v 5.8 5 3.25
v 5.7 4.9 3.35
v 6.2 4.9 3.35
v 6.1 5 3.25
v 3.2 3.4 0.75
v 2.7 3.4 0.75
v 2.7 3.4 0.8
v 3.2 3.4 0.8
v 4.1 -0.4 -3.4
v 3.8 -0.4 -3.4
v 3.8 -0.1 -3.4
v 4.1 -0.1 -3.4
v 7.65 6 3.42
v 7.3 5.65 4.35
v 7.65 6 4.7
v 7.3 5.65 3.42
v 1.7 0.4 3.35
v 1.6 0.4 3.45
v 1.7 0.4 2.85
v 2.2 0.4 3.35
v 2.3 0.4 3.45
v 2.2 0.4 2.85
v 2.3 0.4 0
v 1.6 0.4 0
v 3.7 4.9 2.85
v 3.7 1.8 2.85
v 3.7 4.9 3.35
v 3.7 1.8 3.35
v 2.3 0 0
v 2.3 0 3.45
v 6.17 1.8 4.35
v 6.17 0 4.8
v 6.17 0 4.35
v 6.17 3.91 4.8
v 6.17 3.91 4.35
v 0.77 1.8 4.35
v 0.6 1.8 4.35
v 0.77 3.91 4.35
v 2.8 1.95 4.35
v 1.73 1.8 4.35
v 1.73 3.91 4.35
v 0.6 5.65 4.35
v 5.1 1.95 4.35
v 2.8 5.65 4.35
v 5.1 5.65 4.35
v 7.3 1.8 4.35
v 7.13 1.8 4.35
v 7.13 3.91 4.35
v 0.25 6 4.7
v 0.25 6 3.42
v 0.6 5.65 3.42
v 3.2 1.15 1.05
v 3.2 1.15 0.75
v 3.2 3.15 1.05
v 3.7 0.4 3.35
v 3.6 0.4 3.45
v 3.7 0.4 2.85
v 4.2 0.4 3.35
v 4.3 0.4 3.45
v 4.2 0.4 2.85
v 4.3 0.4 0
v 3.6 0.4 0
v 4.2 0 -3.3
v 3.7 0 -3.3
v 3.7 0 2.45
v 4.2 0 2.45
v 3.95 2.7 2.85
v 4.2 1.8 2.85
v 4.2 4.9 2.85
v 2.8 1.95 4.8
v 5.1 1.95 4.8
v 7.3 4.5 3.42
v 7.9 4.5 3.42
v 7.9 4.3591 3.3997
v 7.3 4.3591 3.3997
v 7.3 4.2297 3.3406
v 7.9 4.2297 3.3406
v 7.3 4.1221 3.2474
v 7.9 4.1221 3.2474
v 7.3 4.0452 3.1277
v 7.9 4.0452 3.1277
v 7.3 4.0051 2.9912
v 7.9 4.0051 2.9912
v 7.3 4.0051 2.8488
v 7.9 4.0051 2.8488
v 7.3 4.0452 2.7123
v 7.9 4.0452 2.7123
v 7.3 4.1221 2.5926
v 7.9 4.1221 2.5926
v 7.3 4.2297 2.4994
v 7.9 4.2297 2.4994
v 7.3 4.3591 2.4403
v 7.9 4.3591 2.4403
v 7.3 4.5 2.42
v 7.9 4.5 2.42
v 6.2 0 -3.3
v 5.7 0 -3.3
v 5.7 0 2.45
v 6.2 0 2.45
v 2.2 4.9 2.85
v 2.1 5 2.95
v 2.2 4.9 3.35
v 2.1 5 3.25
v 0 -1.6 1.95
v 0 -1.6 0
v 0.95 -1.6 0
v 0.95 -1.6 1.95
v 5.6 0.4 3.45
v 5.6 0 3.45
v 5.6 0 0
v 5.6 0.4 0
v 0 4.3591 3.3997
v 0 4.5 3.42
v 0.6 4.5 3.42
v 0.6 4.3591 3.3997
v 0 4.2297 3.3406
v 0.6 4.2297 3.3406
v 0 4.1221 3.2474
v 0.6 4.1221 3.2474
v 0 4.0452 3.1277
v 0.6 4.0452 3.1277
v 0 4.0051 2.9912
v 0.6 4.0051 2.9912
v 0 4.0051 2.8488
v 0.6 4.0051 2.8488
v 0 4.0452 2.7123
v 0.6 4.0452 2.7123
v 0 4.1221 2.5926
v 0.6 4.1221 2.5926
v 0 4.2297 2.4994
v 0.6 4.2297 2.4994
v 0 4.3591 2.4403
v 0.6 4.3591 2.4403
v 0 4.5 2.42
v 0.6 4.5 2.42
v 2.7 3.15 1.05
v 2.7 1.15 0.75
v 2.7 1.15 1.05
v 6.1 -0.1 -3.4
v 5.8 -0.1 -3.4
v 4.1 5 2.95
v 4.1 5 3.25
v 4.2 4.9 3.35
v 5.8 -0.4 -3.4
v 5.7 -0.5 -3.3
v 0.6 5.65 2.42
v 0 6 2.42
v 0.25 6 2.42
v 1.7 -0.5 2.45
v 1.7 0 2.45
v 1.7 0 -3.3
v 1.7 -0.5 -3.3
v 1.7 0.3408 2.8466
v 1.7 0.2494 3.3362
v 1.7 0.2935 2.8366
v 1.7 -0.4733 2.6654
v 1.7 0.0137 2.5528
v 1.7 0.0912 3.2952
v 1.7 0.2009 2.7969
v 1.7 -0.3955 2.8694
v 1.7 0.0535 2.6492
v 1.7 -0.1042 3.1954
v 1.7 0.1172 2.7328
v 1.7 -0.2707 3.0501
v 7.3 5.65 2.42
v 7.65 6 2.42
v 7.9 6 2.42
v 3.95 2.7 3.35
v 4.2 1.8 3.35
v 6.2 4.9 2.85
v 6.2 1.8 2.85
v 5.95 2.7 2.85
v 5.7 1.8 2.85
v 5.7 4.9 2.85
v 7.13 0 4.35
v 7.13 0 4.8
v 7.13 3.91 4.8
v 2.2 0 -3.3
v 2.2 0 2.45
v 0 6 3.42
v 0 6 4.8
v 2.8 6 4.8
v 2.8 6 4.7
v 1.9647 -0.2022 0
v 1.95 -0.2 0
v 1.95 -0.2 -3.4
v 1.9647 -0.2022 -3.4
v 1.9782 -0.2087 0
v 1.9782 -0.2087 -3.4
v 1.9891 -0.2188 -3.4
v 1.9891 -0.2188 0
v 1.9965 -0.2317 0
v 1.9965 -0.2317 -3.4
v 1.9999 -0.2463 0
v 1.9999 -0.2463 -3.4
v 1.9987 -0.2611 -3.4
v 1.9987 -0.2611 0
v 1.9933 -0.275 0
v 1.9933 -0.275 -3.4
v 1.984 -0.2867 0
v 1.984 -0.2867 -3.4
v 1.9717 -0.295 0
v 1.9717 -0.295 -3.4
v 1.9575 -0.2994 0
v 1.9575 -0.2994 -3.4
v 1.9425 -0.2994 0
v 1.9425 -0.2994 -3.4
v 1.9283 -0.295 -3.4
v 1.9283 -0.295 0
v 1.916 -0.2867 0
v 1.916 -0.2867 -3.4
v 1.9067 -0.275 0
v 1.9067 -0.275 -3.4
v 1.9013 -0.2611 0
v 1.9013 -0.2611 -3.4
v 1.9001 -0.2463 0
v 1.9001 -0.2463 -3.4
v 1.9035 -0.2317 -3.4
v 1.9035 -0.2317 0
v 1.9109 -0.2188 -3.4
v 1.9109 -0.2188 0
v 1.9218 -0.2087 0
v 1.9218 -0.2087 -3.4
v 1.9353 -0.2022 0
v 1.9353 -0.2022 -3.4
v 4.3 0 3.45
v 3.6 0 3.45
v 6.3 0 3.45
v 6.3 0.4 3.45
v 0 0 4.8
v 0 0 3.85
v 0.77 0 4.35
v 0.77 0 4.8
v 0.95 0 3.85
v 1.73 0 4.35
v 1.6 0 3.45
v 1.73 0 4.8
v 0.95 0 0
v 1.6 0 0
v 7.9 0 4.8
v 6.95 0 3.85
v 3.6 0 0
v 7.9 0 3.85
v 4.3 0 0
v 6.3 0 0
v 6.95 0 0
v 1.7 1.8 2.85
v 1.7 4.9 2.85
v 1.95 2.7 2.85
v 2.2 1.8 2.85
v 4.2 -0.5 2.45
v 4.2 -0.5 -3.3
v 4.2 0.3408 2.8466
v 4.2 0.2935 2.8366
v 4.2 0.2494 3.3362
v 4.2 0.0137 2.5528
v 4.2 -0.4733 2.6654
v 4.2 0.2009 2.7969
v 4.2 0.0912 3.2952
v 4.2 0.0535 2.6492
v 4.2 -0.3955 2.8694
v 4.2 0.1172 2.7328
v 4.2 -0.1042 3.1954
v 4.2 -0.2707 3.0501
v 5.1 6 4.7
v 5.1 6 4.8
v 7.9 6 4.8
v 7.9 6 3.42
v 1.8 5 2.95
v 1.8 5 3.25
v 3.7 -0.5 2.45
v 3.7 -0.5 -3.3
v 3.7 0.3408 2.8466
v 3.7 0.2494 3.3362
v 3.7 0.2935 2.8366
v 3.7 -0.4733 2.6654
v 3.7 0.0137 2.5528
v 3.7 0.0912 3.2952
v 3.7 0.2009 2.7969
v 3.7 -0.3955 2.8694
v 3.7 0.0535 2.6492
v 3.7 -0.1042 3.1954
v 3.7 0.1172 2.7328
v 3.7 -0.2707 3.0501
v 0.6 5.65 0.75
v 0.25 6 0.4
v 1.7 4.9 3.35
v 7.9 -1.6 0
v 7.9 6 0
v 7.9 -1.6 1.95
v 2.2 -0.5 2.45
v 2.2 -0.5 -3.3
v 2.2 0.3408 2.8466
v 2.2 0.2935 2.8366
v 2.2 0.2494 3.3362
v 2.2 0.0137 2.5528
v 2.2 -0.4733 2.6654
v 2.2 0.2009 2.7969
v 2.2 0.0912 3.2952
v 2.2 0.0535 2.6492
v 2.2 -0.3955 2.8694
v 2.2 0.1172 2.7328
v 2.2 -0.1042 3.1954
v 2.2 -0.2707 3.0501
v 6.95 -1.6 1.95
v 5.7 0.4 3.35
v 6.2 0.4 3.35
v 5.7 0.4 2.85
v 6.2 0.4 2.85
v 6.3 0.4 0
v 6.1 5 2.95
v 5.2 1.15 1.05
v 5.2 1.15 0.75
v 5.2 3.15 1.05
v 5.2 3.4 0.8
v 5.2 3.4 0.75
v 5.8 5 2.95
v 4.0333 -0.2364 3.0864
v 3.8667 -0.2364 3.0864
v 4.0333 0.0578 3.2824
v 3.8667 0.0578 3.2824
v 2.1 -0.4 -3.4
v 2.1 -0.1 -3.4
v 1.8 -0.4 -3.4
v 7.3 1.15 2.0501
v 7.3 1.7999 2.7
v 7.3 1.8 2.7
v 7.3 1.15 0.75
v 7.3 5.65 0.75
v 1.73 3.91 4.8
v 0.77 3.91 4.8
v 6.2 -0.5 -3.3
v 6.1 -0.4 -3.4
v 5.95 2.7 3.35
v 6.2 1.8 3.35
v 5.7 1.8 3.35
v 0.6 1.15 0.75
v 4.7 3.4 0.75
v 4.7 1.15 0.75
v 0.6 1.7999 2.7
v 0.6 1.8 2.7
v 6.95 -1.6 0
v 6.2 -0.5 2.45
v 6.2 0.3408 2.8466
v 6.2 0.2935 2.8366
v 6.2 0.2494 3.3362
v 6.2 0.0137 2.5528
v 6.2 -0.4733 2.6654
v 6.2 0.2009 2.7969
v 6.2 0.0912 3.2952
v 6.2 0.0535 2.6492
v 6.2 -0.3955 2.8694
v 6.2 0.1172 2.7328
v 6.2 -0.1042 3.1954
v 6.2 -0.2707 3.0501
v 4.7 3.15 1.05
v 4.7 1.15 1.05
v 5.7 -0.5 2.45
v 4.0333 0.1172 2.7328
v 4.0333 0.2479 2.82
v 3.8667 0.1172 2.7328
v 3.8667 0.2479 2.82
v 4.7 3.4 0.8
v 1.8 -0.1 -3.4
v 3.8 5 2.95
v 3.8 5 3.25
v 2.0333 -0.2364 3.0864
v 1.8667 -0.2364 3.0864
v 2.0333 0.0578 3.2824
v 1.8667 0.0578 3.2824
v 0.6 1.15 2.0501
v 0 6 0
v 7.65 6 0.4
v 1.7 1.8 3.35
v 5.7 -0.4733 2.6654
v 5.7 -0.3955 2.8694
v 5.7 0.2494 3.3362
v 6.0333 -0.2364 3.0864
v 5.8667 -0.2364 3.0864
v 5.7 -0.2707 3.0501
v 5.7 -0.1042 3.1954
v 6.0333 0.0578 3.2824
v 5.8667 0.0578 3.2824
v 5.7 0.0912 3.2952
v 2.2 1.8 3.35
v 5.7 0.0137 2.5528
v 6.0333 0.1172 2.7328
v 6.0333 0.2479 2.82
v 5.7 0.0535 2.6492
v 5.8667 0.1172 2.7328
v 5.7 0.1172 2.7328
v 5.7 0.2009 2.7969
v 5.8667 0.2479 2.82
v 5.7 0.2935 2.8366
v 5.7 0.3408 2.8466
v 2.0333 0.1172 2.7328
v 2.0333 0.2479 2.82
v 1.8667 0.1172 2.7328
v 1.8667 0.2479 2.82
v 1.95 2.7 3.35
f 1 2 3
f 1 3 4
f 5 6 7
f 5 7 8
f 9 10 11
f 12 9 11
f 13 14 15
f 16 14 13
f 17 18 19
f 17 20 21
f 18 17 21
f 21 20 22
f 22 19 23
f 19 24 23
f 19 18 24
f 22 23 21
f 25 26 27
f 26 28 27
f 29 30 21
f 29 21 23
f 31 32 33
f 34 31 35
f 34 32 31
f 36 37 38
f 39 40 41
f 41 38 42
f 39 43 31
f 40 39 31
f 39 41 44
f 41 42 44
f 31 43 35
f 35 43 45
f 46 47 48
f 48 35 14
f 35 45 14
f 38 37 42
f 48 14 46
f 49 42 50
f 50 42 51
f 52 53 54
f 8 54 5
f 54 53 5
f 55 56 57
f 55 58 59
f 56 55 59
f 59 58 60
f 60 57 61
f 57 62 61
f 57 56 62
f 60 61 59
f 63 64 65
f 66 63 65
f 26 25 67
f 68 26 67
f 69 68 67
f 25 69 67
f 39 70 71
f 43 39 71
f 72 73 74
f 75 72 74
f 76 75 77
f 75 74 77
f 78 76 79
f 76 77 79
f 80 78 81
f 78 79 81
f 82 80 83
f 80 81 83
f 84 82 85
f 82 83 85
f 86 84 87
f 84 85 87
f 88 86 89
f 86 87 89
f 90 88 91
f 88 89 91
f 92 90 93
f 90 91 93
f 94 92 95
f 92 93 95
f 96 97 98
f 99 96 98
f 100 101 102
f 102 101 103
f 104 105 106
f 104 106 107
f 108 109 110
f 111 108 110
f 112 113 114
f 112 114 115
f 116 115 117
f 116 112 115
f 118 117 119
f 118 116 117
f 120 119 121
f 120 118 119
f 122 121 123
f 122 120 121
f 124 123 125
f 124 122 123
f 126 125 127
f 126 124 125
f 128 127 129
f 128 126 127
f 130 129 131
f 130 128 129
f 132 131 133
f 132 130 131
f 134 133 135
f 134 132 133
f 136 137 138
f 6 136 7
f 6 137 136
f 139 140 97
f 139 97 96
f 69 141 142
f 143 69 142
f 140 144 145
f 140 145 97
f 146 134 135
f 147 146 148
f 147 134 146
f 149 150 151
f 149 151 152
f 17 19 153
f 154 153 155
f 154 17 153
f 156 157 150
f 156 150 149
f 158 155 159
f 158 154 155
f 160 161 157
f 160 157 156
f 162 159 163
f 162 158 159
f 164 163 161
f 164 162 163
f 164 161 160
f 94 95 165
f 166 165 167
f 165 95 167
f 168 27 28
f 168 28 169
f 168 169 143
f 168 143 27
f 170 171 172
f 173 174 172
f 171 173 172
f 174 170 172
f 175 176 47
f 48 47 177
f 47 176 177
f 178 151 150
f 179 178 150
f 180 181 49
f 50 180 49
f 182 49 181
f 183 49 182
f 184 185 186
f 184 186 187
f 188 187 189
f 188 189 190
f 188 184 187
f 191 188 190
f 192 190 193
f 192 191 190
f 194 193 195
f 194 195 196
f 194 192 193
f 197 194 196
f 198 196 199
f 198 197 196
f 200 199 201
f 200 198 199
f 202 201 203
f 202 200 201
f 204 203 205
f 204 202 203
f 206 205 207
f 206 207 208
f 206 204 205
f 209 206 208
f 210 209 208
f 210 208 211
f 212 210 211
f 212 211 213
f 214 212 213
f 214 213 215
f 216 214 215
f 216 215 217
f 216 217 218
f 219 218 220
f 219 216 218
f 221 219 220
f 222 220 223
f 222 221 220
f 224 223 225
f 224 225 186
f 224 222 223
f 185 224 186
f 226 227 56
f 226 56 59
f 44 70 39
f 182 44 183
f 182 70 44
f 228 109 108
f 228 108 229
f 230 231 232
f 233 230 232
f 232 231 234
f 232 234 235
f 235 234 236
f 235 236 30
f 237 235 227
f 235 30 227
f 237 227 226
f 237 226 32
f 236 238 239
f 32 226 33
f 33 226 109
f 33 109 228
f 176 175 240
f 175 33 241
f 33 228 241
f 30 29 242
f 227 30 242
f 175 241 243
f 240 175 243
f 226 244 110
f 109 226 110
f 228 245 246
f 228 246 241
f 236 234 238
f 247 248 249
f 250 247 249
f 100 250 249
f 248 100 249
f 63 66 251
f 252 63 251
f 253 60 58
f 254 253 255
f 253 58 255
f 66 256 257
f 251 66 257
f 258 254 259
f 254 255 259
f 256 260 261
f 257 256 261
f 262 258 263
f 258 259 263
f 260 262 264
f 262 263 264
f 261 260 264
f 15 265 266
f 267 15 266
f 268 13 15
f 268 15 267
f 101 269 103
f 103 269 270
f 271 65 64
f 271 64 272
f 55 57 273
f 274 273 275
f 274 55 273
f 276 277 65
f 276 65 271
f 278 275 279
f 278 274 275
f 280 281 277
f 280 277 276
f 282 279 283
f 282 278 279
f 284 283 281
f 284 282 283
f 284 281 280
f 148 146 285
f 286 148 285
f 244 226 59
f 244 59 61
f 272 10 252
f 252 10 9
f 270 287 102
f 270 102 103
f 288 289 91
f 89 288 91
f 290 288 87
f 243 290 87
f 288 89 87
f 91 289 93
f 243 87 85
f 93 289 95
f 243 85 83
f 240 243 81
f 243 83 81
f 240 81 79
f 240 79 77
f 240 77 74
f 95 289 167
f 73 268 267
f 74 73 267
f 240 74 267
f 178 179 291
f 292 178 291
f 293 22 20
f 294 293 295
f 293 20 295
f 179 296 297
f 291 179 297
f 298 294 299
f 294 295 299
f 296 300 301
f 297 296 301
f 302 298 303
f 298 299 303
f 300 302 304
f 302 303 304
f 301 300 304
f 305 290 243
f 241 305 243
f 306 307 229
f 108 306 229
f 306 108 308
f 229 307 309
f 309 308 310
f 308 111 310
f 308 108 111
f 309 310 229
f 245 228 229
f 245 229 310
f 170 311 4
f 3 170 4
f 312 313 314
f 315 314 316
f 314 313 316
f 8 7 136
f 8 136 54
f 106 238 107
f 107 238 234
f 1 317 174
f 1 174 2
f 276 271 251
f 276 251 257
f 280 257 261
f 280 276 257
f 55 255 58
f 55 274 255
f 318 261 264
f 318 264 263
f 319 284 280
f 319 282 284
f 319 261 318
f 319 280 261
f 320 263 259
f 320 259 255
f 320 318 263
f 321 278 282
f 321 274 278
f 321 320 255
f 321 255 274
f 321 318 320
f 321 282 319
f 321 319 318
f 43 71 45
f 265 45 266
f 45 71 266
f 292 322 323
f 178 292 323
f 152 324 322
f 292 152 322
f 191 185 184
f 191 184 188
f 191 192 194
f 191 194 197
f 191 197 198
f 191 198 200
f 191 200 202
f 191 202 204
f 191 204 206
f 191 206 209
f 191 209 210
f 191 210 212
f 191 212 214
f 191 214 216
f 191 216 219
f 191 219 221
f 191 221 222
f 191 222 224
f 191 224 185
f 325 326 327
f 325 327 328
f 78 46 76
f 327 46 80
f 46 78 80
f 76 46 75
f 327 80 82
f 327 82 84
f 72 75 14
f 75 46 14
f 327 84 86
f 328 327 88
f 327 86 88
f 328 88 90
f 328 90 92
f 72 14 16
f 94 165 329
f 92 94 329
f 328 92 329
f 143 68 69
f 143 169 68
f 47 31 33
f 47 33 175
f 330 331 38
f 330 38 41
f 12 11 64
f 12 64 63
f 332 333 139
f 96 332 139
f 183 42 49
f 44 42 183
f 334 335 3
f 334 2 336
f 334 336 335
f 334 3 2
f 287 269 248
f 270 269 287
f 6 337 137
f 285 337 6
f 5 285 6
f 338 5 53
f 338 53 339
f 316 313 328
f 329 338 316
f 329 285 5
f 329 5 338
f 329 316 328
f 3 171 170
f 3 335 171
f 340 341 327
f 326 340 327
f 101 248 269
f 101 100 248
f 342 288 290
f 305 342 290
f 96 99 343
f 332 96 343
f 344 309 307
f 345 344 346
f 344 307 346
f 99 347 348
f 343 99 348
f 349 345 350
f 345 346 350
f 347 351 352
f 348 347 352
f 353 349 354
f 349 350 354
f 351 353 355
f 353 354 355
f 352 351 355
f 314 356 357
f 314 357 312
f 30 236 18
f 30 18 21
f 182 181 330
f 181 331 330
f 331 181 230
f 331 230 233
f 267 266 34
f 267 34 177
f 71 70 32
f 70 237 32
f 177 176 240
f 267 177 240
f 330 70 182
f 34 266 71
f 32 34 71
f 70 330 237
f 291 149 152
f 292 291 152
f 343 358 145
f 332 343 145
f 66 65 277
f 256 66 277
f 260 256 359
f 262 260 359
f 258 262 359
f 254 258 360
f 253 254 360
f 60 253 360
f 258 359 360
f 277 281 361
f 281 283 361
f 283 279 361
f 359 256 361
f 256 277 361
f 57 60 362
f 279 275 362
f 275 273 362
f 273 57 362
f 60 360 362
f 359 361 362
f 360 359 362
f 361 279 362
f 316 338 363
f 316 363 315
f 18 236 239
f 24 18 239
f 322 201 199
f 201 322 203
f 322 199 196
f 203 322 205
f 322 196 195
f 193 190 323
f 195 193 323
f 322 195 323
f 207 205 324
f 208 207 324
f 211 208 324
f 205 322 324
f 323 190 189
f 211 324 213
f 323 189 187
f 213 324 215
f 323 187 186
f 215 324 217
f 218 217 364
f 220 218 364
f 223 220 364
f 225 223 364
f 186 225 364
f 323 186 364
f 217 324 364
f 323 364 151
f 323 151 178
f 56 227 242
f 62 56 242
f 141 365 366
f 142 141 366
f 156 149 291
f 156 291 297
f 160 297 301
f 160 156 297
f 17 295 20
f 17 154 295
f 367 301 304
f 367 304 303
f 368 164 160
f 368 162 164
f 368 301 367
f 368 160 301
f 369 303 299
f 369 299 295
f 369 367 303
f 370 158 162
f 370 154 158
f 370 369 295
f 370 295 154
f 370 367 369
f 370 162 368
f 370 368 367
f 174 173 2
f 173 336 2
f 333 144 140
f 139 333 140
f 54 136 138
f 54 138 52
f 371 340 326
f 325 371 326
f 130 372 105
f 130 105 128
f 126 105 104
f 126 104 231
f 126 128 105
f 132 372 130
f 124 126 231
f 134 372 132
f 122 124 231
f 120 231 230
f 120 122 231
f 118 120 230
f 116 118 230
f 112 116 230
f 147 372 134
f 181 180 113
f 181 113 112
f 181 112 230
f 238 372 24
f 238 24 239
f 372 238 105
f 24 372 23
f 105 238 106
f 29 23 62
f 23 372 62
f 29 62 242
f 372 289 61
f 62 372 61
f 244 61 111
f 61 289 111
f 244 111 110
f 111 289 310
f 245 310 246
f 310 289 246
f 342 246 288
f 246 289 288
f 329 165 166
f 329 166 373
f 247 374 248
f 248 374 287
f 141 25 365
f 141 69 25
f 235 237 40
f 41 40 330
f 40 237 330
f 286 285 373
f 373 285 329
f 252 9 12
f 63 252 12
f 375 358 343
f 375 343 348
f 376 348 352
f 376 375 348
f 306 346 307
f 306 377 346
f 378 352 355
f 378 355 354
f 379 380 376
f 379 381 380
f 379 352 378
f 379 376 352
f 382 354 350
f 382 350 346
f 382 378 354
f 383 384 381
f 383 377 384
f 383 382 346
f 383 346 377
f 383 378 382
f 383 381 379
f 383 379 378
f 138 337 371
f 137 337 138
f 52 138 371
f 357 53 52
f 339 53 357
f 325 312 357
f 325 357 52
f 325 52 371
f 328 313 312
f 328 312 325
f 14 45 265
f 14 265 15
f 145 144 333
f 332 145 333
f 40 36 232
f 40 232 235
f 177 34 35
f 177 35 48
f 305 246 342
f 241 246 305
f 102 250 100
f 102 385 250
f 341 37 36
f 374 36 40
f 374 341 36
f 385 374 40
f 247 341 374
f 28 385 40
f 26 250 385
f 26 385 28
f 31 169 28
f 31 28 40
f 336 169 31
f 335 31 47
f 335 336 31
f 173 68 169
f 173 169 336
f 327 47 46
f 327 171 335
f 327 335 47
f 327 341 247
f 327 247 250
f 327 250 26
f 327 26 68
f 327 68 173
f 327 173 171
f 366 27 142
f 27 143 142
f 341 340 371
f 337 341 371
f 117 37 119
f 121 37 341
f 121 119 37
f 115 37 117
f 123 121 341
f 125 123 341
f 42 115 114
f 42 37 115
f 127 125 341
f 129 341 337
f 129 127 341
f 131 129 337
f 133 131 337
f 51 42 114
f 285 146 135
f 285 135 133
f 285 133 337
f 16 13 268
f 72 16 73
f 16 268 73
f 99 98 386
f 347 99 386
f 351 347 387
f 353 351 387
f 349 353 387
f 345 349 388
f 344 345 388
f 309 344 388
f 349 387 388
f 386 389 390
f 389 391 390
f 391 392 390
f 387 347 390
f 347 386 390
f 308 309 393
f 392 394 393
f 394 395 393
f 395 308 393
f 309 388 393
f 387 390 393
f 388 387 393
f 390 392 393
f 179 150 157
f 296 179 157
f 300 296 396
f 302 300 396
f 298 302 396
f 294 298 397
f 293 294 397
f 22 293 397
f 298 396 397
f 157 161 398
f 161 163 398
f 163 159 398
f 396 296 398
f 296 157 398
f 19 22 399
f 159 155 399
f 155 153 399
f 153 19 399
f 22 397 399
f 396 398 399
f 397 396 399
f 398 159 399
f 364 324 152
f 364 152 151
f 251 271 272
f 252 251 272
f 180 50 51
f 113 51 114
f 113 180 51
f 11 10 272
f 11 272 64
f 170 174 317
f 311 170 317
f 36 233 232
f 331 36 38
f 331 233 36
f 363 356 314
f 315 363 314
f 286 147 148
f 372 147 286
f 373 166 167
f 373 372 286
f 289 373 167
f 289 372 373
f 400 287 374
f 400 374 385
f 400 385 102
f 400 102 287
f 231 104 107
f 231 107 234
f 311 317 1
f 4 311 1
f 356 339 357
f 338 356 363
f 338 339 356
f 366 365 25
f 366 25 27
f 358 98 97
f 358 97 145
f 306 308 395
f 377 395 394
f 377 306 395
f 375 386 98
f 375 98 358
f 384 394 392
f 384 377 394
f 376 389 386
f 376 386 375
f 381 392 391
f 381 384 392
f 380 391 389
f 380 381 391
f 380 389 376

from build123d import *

# Parameters (mm, degrees)
BODY1_W                            = 7.9
BODY1_H                            = 4.8
EXTRUDE_1_DEPTH                    = 6
SKETCH_2_W                         = 6.7
SKETCH_2_H                         = 3.6
CUT_EXTRUDE_1_DEPTH                = 4.2
CHAMFER_1_SIZE                     = 0.35
SKETCH_4_W                         = 0.96
SKETCH_4_H                         = 3.91
CUT_EXTRUDE_3_DEPTH                = 0.45
SKETCH_5_W                         = 0.7
SKETCH_5_H                         = 3.45
CUT_EXTRUDE_4_DEPTH                = 0.4
CUT_EXTRUDE_6_REACH                = 13.02
SKETCH_8_W                         = 2.3
SKETCH_8_H                         = 4.05
CUT_EXTRUDE_7_REACH                = 13.02
SKETCH_15_W                        = 6.7
SKETCH_15_H                        = 1.95
CUT_EXTRUDE_9_DEPTH                = 0.65
CHAMFER_7_SIZE                     = 0.65
SKETCH_10_W                        = 0.5
SKETCH_10_H                        = 2.25
EXTRUDE_2_DEPTH                    = 0.3
CHAMFER_2_SIZE                     = 0.25
PATTERN_LINEAR_3_COUNT             = 2
PATTERN_LINEAR_3_PITCH             = 2
CHAMFER_2_OF_PATTERN_LINEAR_3_SIZE = 0.25
EXTRUDE_5_DEPTH                    = 0.95
SWEEP_START                        = 1.7
SWEEP_1_DEPTH                      = 0.5
CHAMFER_8_SIZE                     = 0.1
PATTERN_LINEAR_5_COUNT             = 3
PATTERN_LINEAR_5_PITCH             = 2
CHAMFER_8_OF_PATTERN_LINEAR_5_SIZE = 0.1
SKETCH_18_R                        = 0.05
CUT_EXTRUDE_10_DEPTH               = 3.4


# Read off the part's stored shape, not the designer's step: По траектории1
with BuildPart() as part:
    # Body1 → Бобышка-Вытянуть1 (new body)
    with BuildSketch(Plane(origin=(0, 0, 0), x_dir=(1, 0, 0), z_dir=(0, 1, 0))):
        with Locations((3.95, -2.4)):
            Rectangle(BODY1_W, BODY1_H)
    extrude(amount=EXTRUDE_1_DEPTH)

    # Эскиз2 → Вырез-Вытянуть1 (cut)
    with BuildSketch(Plane(origin=(0, 6, 0), x_dir=(1, 0, 0), z_dir=(0, 1, 0))):
        with Locations((3.95, -2.55)):
            Rectangle(SKETCH_2_W, SKETCH_2_H)
    extrude(amount=-CUT_EXTRUDE_1_DEPTH, mode=Mode.SUBTRACT)

    # Фаска1
    chamfer_1_edges = [part.edges().sort_by_distance(p)[0] for p in [
        (7.3, 6, 2.55),
        (3.95, 6, 0.75),
        (0.6, 6, 2.55),
        (3.95, 6, 4.35),
    ]]
    chamfer(chamfer_1_edges, length=CHAMFER_1_SIZE)

    # Эскиз4 → Вырез-Вытянуть3 (cut)
    with BuildSketch(Plane.XY.offset(4.8)):
        with Locations((1.25, 1.955)):
            Rectangle(SKETCH_4_W, SKETCH_4_H)
        with Locations((6.65, 1.955)):
            Rectangle(SKETCH_4_W, SKETCH_4_H)
    extrude(amount=-CUT_EXTRUDE_3_DEPTH, mode=Mode.SUBTRACT)

    # Эскиз5 → Вырез-Вытянуть4 (cut)
    with BuildSketch(Plane(origin=(0, 0, 4.8), x_dir=(1, 0, 0), z_dir=(0, 1, 0))):
        with Locations((1.95, 3.075)):
            Rectangle(SKETCH_5_W, SKETCH_5_H)
    cut_extrude_4 = extrude(amount=CUT_EXTRUDE_4_DEPTH, mode=Mode.SUBTRACT)

    # Эскиз8 → Вырез-Вытянуть6 (cut, up to next)
    with BuildSketch(Plane.XY.offset(4.8), mode=Mode.PRIVATE) as cut_extrude_6_sk1:
        with Locations((3.95, 3.975)):
            Rectangle(SKETCH_8_W, SKETCH_8_H)
    cut_extrude_6_tool1 = extrude(cut_extrude_6_sk1.sketch, amount=-CUT_EXTRUDE_6_REACH, mode=Mode.PRIVATE) & part.part
    add(cut_extrude_6_tool1.solids().sort_by_distance((3.95, 3.975, 4.8))[0], mode=Mode.SUBTRACT)

    # Эскиз9 → Вырез-Вытянуть7 (cut, up to next)
    with BuildSketch(Plane.ZY, mode=Mode.PRIVATE) as cut_extrude_7_sk1:
        with BuildLine():
            Line((2.42, 6), (3.42, 6))
            Line((3.42, 6), (3.42, 4.5))
            ThreePointArc((3.42, 4.5), (2.92, 4), (2.42, 4.5))
            Line((2.42, 4.5), (2.42, 6))
        make_face()
    cut_extrude_7_tool1 = extrude(cut_extrude_7_sk1.sketch, amount=-CUT_EXTRUDE_7_REACH, mode=Mode.PRIVATE) & part.part
    cut_extrude_7 = cut_extrude_7_tool1.solids().sort_by_distance((0, 5.05036, 2.92))[0]
    add(cut_extrude_7, mode=Mode.SUBTRACT)

    # Зеркальное отражение1: Вырез-Вытянуть7 across plane
    add(cut_extrude_7.mirror(Plane(origin=(3.95, 0, 0), x_dir=(0, 0, 1), z_dir=(1, 0, 0))), mode=Mode.SUBTRACT)

    # Эскиз15 → Вырез-Вытянуть9 (cut)
    with BuildSketch(Plane(origin=(0, 1.8, 0), x_dir=(1, 0, 0), z_dir=(0, 1, 0))):
        with Locations((3.95, -1.725)):
            Rectangle(SKETCH_15_W, SKETCH_15_H)
    extrude(amount=-CUT_EXTRUDE_9_DEPTH, mode=Mode.SUBTRACT)

    # Фаска7
    chamfer_7_edges = [part.edges().sort_by_distance(p)[0] for p in [
        (3.95, 1.15, 2.7),
    ]]
    chamfer(chamfer_7_edges, length=CHAMFER_7_SIZE - 0.0001)  # a hair under: the kernel refuses the full size

    # Эскиз10 → Бобышка-Вытянуть2 (add)
    with BuildSketch(Plane.XY.offset(0.75)):
        with Locations((2.95, 2.275)):
            Rectangle(SKETCH_10_W, SKETCH_10_H)
    extrude_2 = extrude(amount=EXTRUDE_2_DEPTH)

    # Фаска2
    chamfer_2_edges = [part.edges().sort_by_distance(p)[0] for p in [
        (2.95, 3.4, 1.05),
    ]]
    chamfer(chamfer_2_edges, length=CHAMFER_2_SIZE)

    # Линейный массив3: Бобышка-Вытянуть2 ×2
    with Locations(*[(i * PATTERN_LINEAR_3_PITCH, 0, 0) for i in range(1, PATTERN_LINEAR_3_COUNT)]):
        add(extrude_2)

    # Фаска2 of Линейный массив3
    chamfer_2_of_pattern_linear_3_edges = [part.edges().sort_by_distance(p)[0] for p in [
        (4.95, 3.4, 1.05),
    ]]
    chamfer(chamfer_2_of_pattern_linear_3_edges, length=CHAMFER_2_OF_PATTERN_LINEAR_3_SIZE)

    # Эскиз17 → Бобышка-Вытянуть5 (add)
    with BuildSketch(Plane.ZY):
        Polygon((0, -1.6), (1.95, -1.6), (3.85, 0), (0, 0), align=None)
    extrude_5 = extrude(amount=-EXTRUDE_5_DEPTH)

    # Зеркальное отражение3: Бобышка-Вытянуть5 across plane
    add(extrude_5.mirror(Plane(origin=(3.95, 0, 0), x_dir=(0, 0, 1), z_dir=(1, 0, 0))))

    # По траектории1 outline → По траектории1 (add)
    with BuildSketch(Plane.YZ.offset(SWEEP_START)):
        with BuildLine():
            add(Edge.make_bspline(
                [(-0.5, 2.45), (-0.5, 2.683362296), (-0.405057001, 2.917735205), (-0.152065654, 3.170726552), (-0.050887811, 3.237723146), (0.166472235, 3.327081743), (0.298557942, 3.349954697), (0.4, 3.35)],
                knots=[0.50998091, 0.50998091, 0.50998091, 0.50998091, 0.55448514, 0.55448514, 0.576737255, 0.576737255, 0.59898937, 0.59898937, 0.59898937, 0.59898937], degree=3))
            Line((-0.5, 2.45), (-0.5, -3.4))
            Line((-0.5, -3.4), (0, -3.4))
            Line((0, -3.4), (0, 2.45))
            add(Edge.make_bspline(
                [(0, 2.45), (0, 2.553716576), (0.042196888, 2.657882313), (0.154637487, 2.770322912), (0.199605417, 2.800099176), (0.296209882, 2.839814108), (0.331279974, 2.849979865), (0.4, 2.85)],
                knots=[0.50998091, 0.50998091, 0.50998091, 0.50998091, 0.55448514, 0.55448514, 0.576737255, 0.576737255, 0.59898937, 0.59898937, 0.59898937, 0.59898937], degree=3))
            Line((0.4, 2.85), (0.4, 3.35))
        make_face()
        with BuildLine():
            Line((1.8, 3.35), (1.8, 2.85))
            add(Edge.make_bspline(
                [(1.8, 2.85), (2.1, 2.85), (2.4, 2.85), (3.466666667, 2.85), (4.233333333, 2.85), (5, 2.85)],
                knots=[0.721036083, 0.721036083, 0.721036083, 0.721036083, 0.799494685, 0.799494685, 1, 1, 1, 1], degree=3))
            Line((5, 2.85), (5, 3.35))
            add(Edge.make_bspline(
                [(1.8, 3.35), (2.1, 3.35), (2.4, 3.35), (3.466666667, 3.35), (4.233333333, 3.35), (5, 3.35)],
                knots=[0.721036083, 0.721036083, 0.721036083, 0.721036083, 0.799494685, 0.799494685, 1, 1, 1, 1], degree=3))
        make_face()
    sweep_1 = extrude(amount=SWEEP_1_DEPTH)

    # Фаска8
    chamfer_8_edges = [part.edges().sort_by_distance(p)[0] for p in [
        (1.95, 5, 2.85),
        (2.2, 5, 3.1),
        (1.95, 5, 3.35),
        (1.7, 5, 3.1),
        (1.95, -0.5, -3.4),
        (2.2, -0.25, -3.4),
        (1.95, 0, -3.4),
        (1.7, -0.25, -3.4),
    ]]
    chamfer(chamfer_8_edges, length=CHAMFER_8_SIZE)

    # Линейный массив5: Вырез-Вытянуть4, По траектории1 ×3
    with Locations(*[(i * PATTERN_LINEAR_5_PITCH, 0, 0) for i in range(1, PATTERN_LINEAR_5_COUNT)]):
        add(cut_extrude_4, mode=Mode.SUBTRACT)
        add(sweep_1)

    # Фаска8 of Линейный массив5
    chamfer_8_of_pattern_linear_5_edges = [part.edges().sort_by_distance(p)[0] for p in [
        (3.95, 5, 2.85),
        (4.2, 5, 3.1),
        (3.95, 5, 3.35),
        (3.7, 5, 3.1),
        (3.95, -0.5, -3.4),
        (4.2, -0.25, -3.4),
        (3.95, 0, -3.4),
        (3.7, -0.25, -3.4),
        (5.95, 5, 2.85),
        (6.2, 5, 3.1),
        (5.95, 5, 3.35),
        (5.7, 5, 3.1),
        (5.95, -0.5, -3.4),
        (6.2, -0.25, -3.4),
        (5.95, 0, -3.4),
        (5.7, -0.25, -3.4),
    ]]
    chamfer(chamfer_8_of_pattern_linear_5_edges, length=CHAMFER_8_OF_PATTERN_LINEAR_5_SIZE)

    # Эскиз18 → Вырез-Вытянуть10 (cut)
    with BuildSketch(Plane(origin=(0, 0, 0), x_dir=(-1, 0, 0), z_dir=(0, 0, -1))):
        with Locations(Location((-1.95, -0.25, 0), (0, 0, 90))):
            Circle(SKETCH_18_R)
    extrude(amount=CUT_EXTRUDE_10_DEPTH, mode=Mode.SUBTRACT)


solid = part.part
